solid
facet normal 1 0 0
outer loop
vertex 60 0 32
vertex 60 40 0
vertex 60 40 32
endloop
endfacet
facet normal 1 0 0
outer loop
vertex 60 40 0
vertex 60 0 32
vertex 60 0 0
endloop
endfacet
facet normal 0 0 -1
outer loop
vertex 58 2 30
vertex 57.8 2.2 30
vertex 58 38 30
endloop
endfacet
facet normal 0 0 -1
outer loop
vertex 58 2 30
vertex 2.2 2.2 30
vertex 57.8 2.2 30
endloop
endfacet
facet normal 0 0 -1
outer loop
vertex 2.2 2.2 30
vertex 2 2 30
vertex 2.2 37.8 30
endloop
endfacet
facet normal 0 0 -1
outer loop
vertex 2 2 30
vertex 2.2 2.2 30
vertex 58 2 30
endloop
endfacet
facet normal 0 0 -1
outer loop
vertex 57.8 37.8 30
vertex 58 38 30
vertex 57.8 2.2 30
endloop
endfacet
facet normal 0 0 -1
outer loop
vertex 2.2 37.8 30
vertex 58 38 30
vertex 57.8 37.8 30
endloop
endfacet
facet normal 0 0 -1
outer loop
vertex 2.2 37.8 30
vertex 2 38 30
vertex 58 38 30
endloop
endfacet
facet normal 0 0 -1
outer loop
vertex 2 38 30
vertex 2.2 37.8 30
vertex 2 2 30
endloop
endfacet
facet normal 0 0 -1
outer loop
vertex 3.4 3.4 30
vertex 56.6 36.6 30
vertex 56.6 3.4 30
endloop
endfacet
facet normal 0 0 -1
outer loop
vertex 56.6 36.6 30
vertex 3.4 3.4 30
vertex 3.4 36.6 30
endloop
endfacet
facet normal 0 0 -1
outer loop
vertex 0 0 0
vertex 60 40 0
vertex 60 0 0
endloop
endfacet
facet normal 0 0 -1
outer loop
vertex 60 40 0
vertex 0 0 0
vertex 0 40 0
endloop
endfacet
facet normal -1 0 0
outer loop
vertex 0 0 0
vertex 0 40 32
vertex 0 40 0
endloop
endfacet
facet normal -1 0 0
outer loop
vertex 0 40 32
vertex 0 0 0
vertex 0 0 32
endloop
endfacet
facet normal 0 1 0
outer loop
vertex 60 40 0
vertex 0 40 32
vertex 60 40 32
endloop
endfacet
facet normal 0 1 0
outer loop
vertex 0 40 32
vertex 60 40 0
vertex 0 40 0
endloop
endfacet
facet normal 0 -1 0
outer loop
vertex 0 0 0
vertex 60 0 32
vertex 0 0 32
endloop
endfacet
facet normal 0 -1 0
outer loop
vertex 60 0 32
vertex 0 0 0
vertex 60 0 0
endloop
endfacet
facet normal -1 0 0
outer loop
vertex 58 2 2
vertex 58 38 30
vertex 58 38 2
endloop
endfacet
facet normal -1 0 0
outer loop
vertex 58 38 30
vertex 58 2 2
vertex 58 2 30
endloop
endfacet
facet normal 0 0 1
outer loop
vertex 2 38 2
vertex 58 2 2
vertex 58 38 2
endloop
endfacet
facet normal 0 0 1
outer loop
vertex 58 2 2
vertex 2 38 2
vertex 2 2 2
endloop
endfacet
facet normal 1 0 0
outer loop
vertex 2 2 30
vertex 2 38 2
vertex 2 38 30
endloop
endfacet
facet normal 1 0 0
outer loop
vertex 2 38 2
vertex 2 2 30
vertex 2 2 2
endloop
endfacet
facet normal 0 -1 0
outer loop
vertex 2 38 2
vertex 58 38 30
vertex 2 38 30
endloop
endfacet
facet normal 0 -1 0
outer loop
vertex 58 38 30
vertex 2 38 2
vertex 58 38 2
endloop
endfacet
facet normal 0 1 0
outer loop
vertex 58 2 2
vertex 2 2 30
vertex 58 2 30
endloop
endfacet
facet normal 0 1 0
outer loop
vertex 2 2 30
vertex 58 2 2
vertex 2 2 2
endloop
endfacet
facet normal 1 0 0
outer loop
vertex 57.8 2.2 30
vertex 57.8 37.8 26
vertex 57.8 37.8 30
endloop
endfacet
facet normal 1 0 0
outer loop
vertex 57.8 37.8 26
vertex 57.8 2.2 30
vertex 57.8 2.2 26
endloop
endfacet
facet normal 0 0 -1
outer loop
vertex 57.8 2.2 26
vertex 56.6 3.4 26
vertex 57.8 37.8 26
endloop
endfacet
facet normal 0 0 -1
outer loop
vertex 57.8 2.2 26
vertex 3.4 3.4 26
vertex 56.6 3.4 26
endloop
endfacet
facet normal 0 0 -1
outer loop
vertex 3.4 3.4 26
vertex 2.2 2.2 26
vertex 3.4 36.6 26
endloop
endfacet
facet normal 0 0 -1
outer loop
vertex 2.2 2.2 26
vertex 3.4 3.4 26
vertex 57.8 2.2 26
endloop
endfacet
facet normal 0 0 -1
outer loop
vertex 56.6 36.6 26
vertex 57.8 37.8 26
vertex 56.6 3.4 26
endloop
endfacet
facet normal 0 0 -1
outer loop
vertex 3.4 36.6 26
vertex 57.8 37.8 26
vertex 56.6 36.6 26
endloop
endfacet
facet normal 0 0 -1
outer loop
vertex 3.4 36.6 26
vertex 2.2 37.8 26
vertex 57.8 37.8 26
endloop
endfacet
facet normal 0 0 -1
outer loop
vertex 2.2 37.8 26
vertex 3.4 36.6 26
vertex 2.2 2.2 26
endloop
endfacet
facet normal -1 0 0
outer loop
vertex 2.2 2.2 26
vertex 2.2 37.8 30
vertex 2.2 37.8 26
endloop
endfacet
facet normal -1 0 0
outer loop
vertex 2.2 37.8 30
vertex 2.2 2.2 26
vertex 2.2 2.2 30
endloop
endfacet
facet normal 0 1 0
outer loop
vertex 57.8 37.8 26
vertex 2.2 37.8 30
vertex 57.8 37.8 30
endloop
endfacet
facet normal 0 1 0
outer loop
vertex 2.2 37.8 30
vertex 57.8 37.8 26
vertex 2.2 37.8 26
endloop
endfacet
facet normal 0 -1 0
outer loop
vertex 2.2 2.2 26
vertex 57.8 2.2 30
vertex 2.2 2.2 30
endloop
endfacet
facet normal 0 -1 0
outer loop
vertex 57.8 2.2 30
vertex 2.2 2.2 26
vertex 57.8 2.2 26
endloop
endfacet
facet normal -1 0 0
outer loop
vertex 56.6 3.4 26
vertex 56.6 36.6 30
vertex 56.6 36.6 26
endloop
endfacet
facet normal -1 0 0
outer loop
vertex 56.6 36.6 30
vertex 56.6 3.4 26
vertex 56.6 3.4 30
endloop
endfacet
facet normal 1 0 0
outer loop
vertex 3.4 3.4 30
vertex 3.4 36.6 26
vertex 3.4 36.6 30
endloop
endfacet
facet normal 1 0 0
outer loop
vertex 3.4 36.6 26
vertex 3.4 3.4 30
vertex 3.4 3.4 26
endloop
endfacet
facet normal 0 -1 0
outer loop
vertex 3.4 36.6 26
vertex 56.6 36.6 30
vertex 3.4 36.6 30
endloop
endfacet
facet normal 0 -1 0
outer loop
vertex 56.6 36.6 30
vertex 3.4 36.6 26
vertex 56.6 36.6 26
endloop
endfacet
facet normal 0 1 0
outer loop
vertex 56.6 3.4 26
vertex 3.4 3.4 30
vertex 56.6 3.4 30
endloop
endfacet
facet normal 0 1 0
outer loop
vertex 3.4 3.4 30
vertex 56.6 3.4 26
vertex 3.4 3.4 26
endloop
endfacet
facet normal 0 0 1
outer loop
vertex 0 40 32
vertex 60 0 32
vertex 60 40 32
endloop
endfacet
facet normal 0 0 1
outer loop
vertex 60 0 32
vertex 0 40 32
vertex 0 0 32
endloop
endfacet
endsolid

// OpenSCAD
// Reference solution for `box_lid`: checks the grader, never shown to agents.
module box() difference() {
    cube([60, 40, 30]);
    translate([2, 2, 2]) cube([56, 36, 30]);
}
// A 2 mm plate on the rim with a 1.2 mm lip 4 mm deep, 0.2 mm clearance.
module lid() {
    translate([0, 0, 30]) cube([60, 40, 2]);
    translate([2.2, 2.2, 26]) difference() {
        cube([55.6, 35.6, 4]);
        translate([1.2, 1.2, -1]) cube([53.2, 33.2, 6]);
    }
}
box();
lid();
